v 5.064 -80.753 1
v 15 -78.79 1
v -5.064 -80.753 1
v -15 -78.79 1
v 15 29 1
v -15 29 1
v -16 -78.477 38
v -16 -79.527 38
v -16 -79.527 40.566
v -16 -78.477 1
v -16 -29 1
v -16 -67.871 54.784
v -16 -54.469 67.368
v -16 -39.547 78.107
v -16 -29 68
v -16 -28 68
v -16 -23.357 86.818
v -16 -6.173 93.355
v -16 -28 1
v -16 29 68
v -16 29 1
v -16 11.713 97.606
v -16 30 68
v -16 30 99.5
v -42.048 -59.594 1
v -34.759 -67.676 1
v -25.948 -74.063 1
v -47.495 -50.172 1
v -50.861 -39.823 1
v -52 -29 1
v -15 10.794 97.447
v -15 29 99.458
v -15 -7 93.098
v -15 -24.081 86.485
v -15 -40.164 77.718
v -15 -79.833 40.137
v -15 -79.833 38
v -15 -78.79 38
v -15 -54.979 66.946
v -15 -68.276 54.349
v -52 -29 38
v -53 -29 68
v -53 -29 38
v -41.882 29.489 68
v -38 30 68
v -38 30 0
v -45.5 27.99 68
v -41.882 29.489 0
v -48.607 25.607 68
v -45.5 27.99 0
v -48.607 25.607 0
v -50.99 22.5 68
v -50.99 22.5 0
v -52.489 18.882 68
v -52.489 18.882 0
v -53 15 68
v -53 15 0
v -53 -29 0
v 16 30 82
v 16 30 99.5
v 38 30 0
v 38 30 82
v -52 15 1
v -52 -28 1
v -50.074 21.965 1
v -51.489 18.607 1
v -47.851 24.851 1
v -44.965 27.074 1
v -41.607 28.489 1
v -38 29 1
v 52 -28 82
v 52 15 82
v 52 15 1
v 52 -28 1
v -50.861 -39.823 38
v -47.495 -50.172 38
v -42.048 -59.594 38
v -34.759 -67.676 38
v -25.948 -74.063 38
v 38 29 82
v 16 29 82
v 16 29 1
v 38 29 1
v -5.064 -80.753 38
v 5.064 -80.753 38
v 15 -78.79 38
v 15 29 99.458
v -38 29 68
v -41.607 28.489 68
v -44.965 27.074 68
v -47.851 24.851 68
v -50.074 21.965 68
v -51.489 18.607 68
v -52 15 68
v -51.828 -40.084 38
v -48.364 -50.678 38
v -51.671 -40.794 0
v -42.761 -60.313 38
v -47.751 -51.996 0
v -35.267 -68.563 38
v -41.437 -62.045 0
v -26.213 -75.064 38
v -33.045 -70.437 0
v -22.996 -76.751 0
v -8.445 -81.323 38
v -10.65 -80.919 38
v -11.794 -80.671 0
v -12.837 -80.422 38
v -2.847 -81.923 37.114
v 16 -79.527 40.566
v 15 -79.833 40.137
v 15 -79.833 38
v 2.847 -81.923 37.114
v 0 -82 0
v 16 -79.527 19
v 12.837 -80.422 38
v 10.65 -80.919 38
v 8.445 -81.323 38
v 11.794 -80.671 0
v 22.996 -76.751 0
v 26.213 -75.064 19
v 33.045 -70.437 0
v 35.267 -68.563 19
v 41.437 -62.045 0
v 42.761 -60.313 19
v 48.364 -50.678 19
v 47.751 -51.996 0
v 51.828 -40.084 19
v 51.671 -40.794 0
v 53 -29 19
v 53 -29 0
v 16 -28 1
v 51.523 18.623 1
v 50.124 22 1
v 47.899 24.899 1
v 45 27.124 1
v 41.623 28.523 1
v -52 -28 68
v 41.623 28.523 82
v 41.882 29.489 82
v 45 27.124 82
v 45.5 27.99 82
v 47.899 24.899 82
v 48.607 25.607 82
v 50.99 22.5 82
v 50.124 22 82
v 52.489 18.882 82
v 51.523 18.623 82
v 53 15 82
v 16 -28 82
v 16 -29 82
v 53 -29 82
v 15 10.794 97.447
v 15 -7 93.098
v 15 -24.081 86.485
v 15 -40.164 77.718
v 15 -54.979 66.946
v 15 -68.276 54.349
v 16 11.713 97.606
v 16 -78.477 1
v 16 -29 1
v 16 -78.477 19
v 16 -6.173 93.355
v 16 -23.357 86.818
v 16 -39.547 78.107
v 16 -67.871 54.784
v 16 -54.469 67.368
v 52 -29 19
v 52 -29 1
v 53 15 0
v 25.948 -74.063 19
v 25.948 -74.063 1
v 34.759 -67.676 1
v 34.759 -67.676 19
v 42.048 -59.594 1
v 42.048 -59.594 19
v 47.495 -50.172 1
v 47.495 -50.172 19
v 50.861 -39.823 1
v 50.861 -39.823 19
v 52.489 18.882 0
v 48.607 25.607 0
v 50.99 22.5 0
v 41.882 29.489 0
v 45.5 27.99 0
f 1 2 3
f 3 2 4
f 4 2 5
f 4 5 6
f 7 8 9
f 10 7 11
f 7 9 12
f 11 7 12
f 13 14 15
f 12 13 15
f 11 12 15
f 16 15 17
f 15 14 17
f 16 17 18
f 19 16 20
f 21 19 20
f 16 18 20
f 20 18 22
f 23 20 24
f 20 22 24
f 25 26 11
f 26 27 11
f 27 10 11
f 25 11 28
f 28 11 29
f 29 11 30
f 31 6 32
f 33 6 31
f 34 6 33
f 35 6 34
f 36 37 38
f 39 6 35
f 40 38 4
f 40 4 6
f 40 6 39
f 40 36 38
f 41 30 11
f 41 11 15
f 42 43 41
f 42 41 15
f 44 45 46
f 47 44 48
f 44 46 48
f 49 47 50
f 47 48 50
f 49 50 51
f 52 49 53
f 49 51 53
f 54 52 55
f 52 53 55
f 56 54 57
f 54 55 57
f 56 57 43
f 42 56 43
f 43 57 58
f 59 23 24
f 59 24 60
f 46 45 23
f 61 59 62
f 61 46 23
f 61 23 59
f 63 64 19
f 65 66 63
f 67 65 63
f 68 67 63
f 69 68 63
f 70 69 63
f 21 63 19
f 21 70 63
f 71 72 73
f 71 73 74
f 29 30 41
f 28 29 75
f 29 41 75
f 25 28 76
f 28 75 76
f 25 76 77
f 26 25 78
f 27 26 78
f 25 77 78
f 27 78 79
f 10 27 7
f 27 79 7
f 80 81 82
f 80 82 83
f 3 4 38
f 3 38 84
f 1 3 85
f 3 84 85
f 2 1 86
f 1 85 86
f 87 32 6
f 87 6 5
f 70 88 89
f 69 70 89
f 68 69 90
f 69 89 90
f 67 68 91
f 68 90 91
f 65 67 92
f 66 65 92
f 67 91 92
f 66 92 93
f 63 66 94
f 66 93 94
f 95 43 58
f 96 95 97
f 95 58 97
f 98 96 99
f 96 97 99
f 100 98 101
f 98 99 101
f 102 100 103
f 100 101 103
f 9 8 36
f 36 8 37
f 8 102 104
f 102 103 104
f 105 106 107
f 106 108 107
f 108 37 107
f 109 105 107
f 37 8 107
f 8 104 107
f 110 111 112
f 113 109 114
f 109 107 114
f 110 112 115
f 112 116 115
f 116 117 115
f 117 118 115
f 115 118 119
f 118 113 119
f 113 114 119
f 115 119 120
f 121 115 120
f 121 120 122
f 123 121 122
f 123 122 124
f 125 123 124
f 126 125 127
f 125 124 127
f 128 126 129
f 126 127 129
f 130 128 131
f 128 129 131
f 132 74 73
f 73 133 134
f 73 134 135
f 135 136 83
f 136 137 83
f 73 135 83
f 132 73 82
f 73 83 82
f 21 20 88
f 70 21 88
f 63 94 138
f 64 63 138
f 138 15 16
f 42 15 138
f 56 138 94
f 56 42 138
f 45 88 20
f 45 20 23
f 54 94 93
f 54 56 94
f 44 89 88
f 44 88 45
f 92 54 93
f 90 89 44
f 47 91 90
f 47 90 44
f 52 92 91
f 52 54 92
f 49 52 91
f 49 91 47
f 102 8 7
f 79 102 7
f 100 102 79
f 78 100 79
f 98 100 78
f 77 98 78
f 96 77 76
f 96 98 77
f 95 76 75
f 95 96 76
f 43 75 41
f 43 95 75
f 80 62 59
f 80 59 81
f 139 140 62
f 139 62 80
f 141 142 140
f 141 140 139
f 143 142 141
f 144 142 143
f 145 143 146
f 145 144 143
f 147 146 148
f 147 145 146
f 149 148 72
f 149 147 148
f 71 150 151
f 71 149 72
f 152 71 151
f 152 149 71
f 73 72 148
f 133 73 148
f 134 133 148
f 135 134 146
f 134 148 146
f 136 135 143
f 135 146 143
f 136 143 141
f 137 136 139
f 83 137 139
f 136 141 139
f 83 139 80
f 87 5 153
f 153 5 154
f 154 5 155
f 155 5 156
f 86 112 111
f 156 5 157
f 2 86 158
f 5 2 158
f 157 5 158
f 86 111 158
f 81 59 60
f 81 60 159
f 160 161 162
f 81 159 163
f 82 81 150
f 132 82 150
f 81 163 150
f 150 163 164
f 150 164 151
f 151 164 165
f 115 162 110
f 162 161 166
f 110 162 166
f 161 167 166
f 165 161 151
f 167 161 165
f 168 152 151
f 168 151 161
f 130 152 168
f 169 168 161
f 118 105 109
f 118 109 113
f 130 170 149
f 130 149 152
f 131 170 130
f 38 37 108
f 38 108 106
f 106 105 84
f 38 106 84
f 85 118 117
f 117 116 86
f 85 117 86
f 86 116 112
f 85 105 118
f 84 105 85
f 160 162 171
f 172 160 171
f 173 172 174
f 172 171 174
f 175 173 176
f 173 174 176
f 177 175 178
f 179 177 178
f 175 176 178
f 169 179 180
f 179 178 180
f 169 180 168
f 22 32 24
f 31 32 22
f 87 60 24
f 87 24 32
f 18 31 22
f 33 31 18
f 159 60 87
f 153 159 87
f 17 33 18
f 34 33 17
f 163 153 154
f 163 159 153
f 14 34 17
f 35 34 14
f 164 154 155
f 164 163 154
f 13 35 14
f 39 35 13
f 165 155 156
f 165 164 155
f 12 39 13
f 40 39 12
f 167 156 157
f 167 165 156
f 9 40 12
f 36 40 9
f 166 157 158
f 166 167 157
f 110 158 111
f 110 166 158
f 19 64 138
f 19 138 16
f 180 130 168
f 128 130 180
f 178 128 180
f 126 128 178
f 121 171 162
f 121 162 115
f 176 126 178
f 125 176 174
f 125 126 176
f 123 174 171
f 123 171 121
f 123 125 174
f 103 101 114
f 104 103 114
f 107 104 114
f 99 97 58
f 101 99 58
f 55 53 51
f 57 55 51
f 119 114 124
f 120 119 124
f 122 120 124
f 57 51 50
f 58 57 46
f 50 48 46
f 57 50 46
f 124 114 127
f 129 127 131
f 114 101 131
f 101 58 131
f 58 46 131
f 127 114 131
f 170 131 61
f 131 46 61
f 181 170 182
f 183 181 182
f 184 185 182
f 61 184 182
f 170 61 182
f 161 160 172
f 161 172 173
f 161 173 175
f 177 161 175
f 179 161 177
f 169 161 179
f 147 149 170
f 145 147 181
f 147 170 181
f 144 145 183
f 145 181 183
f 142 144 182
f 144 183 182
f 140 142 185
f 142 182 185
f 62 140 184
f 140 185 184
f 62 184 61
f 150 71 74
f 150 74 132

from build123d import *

# Parameters (mm, degrees)
PAD_DEPTH       = 99.5
POCKET_DEPTH    = 106.001
POCKET001_DEPTH = 105
POCKET002_DEPTH = 37
POCKET003_DEPTH = 37
SKETCH005_W     = 30
SKETCH005_H     = 16.444138
POCKET004_DEPTH = 149


with BuildPart() as part:
    # Sketch → Pad (new body)
    with BuildSketch(Plane.XY):
        with BuildLine():
            Line((-53, 15), (-53, -29))
            ThreePointArc((-53, -29), (0, -82), (53, -29))
            Line((53, 15), (53, -29))
            ThreePointArc((53, 15), (48.606602, 25.606602), (38, 30))
            Line((-38, 30), (38, 30))
            ThreePointArc((-38, 30), (-48.606602, 25.606602), (-53, 15))
        make_face()
    extrude(amount=PAD_DEPTH)

    # Sketch001 (on DatumPlane) → Pocket (cut, through all)
    with BuildSketch(Plane.YZ.offset(53)):
        with BuildLine():
            ThreePointArc((30, 99.5), (-33.496233, 81.683249), (-82, 37))
            Line((-82, 37), (-89.555687, 37))
            Line((-89.555687, 106.401093), (-89.555687, 37))
            Line((30, 106.401093), (-89.555687, 106.401093))
            Line((30, 99.5), (30, 106.401093))
        make_face()
    extrude(amount=-POCKET_DEPTH, mode=Mode.SUBTRACT)

    # Sketch002 (on DatumPlane) → Pocket001 (cut)
    with BuildSketch(Plane.XY.offset(106)):
        with BuildLine():
            Line((-52, -29), (-16, -29))
            Line((-16, -29), (-16, -78.477268))
            ThreePointArc((-52, -29), (-42.047592, -59.594117), (-16, -78.477268))
        make_face()
        with BuildLine():
            Line((-15, 29), (15, 29))
            Line((15, 29), (15, -78.789557))
            ThreePointArc((-15, -78.789557), (0, -81), (15, -78.789557))
            Line((-15, 29), (-15, -78.789557))
        make_face()
        with BuildLine():
            Line((52, -29), (16, -29))
            Line((16, -29), (16, -78.477268))
            ThreePointArc((16, -78.477268), (42.047592, -59.594117), (52, -29))
        make_face()
        with BuildLine():
            Line((-16, 29), (-38.000001, 29))
            ThreePointArc((-38.000001, 29), (-47.850607, 24.850607), (-52, 15))
            Line((-52, 15), (-52, -28))
            Line((-52, -28), (-16, -28))
            Line((-16, -28), (-16, 29))
        make_face()
        with BuildLine():
            Line((16, 29), (38, 29))
            ThreePointArc((52, 15), (47.899495, 24.899495), (38, 29))
            Line((52, 15), (52, -28))
            Line((52, -28), (16, -28))
            Line((16, -28), (16, 29))
        make_face()
    extrude(amount=-POCKET001_DEPTH, mode=Mode.SUBTRACT)

    # Sketch003 (on DatumPlane) → Pocket002 (cut)
    with BuildSketch(Plane.YZ.offset(53)):
        Polygon((-29, 19), (-81, 19), (-81, 99.5), (-29.5, 99.5), (30, 99.5), (30, 82), (-29, 82), align=None)
    extrude(amount=-POCKET002_DEPTH, mode=Mode.SUBTRACT)

    # Sketch004 (on DatumPlane) → Pocket003 (cut)
    with BuildSketch(Plane(origin=(-53, 0, 0), x_dir=(0, -1, 0), z_dir=(-1, 0, 0))):
        Polygon((81, 38), (29, 38), (29, 68), (-30, 68), (-30, 99.5), (81, 99.5), align=None)
    extrude(amount=-POCKET003_DEPTH, mode=Mode.SUBTRACT)

    # Sketch005 (on DatumPlane) → Pocket004 (cut)
    with BuildSketch(Plane(origin=(-53, -120, 0), x_dir=(1, 0, 0), z_dir=(0, -1, 0))):
        with Locations((53, 46.222069)):
            Rectangle(SKETCH005_W, SKETCH005_H)
    extrude(amount=-POCKET004_DEPTH, mode=Mode.SUBTRACT)


solid = part.part
